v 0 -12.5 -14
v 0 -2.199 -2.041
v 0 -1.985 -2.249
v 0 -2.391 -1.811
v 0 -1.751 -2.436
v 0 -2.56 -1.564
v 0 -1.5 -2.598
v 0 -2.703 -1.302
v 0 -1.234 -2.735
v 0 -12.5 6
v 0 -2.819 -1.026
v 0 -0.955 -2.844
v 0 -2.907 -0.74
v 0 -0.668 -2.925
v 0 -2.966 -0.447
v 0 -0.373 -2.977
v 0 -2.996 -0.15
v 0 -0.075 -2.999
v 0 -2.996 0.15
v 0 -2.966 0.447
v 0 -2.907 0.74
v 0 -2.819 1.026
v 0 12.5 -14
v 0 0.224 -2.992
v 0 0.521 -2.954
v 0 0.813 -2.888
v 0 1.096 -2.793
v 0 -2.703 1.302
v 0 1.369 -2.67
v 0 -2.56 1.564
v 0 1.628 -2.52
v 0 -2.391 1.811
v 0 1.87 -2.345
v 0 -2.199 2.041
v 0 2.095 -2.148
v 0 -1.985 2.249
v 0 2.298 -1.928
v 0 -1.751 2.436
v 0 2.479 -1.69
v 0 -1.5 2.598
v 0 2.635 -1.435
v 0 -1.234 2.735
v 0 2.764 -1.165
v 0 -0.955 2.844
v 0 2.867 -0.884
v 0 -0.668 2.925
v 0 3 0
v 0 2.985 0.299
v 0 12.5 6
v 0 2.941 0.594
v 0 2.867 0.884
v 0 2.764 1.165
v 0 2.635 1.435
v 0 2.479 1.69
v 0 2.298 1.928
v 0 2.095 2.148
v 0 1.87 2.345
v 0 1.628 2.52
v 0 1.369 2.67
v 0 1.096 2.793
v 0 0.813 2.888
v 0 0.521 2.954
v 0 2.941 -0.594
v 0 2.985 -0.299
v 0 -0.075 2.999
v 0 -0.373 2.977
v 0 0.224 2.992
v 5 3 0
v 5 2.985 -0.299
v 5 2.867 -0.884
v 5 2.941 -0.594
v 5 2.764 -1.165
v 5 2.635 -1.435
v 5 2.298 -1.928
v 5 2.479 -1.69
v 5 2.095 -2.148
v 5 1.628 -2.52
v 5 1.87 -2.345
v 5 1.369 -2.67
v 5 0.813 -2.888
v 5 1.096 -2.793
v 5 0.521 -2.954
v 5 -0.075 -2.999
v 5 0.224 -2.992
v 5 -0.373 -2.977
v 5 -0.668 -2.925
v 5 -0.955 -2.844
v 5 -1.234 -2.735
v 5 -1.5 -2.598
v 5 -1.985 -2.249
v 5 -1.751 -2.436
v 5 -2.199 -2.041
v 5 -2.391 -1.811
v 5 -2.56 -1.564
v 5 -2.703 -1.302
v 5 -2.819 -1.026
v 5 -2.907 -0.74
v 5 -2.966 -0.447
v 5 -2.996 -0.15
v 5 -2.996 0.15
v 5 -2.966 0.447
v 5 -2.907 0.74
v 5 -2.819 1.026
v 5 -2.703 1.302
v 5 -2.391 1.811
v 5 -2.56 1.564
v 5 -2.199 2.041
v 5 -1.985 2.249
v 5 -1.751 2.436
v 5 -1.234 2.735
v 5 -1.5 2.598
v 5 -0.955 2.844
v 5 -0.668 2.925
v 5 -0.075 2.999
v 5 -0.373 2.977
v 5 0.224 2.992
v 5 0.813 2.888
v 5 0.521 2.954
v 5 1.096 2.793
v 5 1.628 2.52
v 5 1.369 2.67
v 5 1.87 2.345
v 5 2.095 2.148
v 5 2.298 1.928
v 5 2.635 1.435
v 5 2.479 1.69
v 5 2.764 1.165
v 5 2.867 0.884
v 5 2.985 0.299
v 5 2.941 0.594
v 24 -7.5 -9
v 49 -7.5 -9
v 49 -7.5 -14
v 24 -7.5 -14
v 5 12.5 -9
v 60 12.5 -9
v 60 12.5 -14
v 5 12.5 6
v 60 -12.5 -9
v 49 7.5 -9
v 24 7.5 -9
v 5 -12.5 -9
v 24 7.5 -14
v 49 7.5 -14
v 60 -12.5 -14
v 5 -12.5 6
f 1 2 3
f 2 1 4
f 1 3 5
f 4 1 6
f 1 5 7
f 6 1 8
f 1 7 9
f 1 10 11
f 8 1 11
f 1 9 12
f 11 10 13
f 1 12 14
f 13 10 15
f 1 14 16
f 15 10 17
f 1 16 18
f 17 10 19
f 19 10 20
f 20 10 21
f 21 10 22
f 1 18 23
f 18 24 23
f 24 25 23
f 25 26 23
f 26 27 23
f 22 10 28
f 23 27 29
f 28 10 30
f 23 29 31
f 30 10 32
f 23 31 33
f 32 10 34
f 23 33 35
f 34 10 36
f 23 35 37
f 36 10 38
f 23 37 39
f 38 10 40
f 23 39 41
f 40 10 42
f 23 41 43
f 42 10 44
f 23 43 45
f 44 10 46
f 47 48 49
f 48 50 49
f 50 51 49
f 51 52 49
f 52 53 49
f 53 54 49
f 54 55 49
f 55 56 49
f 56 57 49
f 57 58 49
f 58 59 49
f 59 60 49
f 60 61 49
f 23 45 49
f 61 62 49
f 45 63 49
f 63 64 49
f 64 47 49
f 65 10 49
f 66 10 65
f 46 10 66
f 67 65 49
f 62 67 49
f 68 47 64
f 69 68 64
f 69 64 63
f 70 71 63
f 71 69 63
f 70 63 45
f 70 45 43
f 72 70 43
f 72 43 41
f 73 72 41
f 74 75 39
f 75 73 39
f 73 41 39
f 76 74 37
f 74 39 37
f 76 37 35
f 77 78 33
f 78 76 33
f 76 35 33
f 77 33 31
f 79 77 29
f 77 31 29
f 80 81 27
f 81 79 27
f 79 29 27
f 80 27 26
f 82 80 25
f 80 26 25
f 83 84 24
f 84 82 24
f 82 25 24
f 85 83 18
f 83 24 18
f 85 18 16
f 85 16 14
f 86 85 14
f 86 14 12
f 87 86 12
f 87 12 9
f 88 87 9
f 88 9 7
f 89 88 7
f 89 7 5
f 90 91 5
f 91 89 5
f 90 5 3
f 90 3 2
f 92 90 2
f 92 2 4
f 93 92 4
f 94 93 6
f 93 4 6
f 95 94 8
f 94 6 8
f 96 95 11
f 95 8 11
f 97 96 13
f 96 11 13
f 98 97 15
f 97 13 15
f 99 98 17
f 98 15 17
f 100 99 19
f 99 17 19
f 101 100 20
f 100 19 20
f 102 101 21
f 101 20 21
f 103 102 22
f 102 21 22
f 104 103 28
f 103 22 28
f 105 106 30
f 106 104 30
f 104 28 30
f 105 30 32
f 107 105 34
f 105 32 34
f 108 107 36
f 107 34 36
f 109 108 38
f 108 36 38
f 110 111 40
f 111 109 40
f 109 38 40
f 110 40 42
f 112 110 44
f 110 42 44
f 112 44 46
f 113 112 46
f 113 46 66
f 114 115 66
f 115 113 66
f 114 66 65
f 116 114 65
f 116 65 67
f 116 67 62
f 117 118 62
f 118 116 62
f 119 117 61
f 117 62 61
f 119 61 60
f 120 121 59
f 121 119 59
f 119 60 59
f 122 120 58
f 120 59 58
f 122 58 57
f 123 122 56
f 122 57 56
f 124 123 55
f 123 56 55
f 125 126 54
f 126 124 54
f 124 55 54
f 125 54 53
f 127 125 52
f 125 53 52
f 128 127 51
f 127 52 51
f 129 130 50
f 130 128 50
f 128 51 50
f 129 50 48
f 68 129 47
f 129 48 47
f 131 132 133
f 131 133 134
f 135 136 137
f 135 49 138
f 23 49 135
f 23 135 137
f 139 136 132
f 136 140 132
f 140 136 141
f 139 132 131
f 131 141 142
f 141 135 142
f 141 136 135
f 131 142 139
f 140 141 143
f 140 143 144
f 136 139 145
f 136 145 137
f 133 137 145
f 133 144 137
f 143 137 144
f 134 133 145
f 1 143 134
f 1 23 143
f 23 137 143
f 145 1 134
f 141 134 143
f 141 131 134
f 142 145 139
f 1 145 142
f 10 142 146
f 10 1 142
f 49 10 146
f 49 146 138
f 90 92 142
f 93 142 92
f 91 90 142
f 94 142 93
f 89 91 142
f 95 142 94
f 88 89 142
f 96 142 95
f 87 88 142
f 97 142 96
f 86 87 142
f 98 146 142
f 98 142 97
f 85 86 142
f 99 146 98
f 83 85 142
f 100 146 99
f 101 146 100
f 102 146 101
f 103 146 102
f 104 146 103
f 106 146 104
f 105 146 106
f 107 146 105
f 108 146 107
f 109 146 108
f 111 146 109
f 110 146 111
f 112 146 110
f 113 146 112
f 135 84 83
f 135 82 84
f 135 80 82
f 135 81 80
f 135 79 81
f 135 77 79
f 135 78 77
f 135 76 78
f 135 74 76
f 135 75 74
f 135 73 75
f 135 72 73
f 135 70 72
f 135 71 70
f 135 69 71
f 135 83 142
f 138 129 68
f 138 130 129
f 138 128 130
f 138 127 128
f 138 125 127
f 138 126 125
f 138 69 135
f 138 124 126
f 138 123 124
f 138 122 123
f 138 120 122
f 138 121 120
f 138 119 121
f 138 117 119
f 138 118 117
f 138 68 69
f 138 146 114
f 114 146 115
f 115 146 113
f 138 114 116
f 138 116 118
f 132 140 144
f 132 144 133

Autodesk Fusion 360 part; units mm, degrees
sketch "Sketch1" plane through (0, 0, 0) normal (1, 0, 0) x (0, 1, 0)
  line L0 (12.5, -14) -> (-12.5, -14)
  line L1 (-12.5, -14) -> (-12.5, 6)
  line L2 (-12.5, 6) -> (12.5, 6)
  line L3 (12.5, 6) -> (12.5, -14)
  circle A0 centre (0, 0) radius 3
  dimension "d1" = 25
  dimension "d2" = 20
  dimension "d3" = 6
  dimension "d14" = 6
extrude "Extrude1" add sketch "Sketch1" along normal blind 5
sketch "Sketch2" plane through (5, 0, 0) normal (1, 0, 0) x (0, 1, 0)
  circle A0 centre (0, 0) radius 3
  line L0 (12.5, 6) -> (-12.5, 6)
  line L1 (-12.5, 6) -> (-12.5, -14)
  line L2 (-12.5, -14) -> (12.5, -14)
  line L3 (12.5, -14) -> (12.5, 6)
  line L4 (-12.5, -14) -> (12.5, -14)
  line L5 (12.5, -14) -> (12.5, -9)
  line L6 (12.5, -9) -> (-12.5, -9)
  line L7 (-12.5, -9) -> (-12.5, -14)
  dimension "d6" = 5
extrude "Extrude2" add sketch "Sketch2" along normal blind 55 contours L1 L2 L3 L4 L5 L6 L7
sketch "Sketch3" plane through (0, 0, -9) normal (0, 0, 1) x (-1, 0, 0)
  line L0 (-5, -12.5) -> (-5, 12.5)
  line L1 (-5, 12.5) -> (-60, 12.5)
  line L2 (-60, 12.5) -> (-60, -12.5)
  line L3 (-60, -12.5) -> (-5, -12.5)
  line L4 (-49, 7.5) -> (-24, 7.5)
  line L5 (-24, 7.5) -> (-24, -7.5)
  line L6 (-24, -7.5) -> (-49, -7.5)
  line L7 (-49, -7.5) -> (-49, 7.5)
  line L8 (-49, 7.5) -> (-24, -7.5) construction
  line L9 (-24, 7.5) -> (-49, -7.5) construction
  point P0 (-36.5, 0)
  dimension "d9" = 25
  dimension "d10" = 15
  dimension "d13" = 5
  dimension "d15" = 11
extrude "Extrude3" cut sketch "Sketch3" against normal blind 10 contours L4 L5 L6 L7
